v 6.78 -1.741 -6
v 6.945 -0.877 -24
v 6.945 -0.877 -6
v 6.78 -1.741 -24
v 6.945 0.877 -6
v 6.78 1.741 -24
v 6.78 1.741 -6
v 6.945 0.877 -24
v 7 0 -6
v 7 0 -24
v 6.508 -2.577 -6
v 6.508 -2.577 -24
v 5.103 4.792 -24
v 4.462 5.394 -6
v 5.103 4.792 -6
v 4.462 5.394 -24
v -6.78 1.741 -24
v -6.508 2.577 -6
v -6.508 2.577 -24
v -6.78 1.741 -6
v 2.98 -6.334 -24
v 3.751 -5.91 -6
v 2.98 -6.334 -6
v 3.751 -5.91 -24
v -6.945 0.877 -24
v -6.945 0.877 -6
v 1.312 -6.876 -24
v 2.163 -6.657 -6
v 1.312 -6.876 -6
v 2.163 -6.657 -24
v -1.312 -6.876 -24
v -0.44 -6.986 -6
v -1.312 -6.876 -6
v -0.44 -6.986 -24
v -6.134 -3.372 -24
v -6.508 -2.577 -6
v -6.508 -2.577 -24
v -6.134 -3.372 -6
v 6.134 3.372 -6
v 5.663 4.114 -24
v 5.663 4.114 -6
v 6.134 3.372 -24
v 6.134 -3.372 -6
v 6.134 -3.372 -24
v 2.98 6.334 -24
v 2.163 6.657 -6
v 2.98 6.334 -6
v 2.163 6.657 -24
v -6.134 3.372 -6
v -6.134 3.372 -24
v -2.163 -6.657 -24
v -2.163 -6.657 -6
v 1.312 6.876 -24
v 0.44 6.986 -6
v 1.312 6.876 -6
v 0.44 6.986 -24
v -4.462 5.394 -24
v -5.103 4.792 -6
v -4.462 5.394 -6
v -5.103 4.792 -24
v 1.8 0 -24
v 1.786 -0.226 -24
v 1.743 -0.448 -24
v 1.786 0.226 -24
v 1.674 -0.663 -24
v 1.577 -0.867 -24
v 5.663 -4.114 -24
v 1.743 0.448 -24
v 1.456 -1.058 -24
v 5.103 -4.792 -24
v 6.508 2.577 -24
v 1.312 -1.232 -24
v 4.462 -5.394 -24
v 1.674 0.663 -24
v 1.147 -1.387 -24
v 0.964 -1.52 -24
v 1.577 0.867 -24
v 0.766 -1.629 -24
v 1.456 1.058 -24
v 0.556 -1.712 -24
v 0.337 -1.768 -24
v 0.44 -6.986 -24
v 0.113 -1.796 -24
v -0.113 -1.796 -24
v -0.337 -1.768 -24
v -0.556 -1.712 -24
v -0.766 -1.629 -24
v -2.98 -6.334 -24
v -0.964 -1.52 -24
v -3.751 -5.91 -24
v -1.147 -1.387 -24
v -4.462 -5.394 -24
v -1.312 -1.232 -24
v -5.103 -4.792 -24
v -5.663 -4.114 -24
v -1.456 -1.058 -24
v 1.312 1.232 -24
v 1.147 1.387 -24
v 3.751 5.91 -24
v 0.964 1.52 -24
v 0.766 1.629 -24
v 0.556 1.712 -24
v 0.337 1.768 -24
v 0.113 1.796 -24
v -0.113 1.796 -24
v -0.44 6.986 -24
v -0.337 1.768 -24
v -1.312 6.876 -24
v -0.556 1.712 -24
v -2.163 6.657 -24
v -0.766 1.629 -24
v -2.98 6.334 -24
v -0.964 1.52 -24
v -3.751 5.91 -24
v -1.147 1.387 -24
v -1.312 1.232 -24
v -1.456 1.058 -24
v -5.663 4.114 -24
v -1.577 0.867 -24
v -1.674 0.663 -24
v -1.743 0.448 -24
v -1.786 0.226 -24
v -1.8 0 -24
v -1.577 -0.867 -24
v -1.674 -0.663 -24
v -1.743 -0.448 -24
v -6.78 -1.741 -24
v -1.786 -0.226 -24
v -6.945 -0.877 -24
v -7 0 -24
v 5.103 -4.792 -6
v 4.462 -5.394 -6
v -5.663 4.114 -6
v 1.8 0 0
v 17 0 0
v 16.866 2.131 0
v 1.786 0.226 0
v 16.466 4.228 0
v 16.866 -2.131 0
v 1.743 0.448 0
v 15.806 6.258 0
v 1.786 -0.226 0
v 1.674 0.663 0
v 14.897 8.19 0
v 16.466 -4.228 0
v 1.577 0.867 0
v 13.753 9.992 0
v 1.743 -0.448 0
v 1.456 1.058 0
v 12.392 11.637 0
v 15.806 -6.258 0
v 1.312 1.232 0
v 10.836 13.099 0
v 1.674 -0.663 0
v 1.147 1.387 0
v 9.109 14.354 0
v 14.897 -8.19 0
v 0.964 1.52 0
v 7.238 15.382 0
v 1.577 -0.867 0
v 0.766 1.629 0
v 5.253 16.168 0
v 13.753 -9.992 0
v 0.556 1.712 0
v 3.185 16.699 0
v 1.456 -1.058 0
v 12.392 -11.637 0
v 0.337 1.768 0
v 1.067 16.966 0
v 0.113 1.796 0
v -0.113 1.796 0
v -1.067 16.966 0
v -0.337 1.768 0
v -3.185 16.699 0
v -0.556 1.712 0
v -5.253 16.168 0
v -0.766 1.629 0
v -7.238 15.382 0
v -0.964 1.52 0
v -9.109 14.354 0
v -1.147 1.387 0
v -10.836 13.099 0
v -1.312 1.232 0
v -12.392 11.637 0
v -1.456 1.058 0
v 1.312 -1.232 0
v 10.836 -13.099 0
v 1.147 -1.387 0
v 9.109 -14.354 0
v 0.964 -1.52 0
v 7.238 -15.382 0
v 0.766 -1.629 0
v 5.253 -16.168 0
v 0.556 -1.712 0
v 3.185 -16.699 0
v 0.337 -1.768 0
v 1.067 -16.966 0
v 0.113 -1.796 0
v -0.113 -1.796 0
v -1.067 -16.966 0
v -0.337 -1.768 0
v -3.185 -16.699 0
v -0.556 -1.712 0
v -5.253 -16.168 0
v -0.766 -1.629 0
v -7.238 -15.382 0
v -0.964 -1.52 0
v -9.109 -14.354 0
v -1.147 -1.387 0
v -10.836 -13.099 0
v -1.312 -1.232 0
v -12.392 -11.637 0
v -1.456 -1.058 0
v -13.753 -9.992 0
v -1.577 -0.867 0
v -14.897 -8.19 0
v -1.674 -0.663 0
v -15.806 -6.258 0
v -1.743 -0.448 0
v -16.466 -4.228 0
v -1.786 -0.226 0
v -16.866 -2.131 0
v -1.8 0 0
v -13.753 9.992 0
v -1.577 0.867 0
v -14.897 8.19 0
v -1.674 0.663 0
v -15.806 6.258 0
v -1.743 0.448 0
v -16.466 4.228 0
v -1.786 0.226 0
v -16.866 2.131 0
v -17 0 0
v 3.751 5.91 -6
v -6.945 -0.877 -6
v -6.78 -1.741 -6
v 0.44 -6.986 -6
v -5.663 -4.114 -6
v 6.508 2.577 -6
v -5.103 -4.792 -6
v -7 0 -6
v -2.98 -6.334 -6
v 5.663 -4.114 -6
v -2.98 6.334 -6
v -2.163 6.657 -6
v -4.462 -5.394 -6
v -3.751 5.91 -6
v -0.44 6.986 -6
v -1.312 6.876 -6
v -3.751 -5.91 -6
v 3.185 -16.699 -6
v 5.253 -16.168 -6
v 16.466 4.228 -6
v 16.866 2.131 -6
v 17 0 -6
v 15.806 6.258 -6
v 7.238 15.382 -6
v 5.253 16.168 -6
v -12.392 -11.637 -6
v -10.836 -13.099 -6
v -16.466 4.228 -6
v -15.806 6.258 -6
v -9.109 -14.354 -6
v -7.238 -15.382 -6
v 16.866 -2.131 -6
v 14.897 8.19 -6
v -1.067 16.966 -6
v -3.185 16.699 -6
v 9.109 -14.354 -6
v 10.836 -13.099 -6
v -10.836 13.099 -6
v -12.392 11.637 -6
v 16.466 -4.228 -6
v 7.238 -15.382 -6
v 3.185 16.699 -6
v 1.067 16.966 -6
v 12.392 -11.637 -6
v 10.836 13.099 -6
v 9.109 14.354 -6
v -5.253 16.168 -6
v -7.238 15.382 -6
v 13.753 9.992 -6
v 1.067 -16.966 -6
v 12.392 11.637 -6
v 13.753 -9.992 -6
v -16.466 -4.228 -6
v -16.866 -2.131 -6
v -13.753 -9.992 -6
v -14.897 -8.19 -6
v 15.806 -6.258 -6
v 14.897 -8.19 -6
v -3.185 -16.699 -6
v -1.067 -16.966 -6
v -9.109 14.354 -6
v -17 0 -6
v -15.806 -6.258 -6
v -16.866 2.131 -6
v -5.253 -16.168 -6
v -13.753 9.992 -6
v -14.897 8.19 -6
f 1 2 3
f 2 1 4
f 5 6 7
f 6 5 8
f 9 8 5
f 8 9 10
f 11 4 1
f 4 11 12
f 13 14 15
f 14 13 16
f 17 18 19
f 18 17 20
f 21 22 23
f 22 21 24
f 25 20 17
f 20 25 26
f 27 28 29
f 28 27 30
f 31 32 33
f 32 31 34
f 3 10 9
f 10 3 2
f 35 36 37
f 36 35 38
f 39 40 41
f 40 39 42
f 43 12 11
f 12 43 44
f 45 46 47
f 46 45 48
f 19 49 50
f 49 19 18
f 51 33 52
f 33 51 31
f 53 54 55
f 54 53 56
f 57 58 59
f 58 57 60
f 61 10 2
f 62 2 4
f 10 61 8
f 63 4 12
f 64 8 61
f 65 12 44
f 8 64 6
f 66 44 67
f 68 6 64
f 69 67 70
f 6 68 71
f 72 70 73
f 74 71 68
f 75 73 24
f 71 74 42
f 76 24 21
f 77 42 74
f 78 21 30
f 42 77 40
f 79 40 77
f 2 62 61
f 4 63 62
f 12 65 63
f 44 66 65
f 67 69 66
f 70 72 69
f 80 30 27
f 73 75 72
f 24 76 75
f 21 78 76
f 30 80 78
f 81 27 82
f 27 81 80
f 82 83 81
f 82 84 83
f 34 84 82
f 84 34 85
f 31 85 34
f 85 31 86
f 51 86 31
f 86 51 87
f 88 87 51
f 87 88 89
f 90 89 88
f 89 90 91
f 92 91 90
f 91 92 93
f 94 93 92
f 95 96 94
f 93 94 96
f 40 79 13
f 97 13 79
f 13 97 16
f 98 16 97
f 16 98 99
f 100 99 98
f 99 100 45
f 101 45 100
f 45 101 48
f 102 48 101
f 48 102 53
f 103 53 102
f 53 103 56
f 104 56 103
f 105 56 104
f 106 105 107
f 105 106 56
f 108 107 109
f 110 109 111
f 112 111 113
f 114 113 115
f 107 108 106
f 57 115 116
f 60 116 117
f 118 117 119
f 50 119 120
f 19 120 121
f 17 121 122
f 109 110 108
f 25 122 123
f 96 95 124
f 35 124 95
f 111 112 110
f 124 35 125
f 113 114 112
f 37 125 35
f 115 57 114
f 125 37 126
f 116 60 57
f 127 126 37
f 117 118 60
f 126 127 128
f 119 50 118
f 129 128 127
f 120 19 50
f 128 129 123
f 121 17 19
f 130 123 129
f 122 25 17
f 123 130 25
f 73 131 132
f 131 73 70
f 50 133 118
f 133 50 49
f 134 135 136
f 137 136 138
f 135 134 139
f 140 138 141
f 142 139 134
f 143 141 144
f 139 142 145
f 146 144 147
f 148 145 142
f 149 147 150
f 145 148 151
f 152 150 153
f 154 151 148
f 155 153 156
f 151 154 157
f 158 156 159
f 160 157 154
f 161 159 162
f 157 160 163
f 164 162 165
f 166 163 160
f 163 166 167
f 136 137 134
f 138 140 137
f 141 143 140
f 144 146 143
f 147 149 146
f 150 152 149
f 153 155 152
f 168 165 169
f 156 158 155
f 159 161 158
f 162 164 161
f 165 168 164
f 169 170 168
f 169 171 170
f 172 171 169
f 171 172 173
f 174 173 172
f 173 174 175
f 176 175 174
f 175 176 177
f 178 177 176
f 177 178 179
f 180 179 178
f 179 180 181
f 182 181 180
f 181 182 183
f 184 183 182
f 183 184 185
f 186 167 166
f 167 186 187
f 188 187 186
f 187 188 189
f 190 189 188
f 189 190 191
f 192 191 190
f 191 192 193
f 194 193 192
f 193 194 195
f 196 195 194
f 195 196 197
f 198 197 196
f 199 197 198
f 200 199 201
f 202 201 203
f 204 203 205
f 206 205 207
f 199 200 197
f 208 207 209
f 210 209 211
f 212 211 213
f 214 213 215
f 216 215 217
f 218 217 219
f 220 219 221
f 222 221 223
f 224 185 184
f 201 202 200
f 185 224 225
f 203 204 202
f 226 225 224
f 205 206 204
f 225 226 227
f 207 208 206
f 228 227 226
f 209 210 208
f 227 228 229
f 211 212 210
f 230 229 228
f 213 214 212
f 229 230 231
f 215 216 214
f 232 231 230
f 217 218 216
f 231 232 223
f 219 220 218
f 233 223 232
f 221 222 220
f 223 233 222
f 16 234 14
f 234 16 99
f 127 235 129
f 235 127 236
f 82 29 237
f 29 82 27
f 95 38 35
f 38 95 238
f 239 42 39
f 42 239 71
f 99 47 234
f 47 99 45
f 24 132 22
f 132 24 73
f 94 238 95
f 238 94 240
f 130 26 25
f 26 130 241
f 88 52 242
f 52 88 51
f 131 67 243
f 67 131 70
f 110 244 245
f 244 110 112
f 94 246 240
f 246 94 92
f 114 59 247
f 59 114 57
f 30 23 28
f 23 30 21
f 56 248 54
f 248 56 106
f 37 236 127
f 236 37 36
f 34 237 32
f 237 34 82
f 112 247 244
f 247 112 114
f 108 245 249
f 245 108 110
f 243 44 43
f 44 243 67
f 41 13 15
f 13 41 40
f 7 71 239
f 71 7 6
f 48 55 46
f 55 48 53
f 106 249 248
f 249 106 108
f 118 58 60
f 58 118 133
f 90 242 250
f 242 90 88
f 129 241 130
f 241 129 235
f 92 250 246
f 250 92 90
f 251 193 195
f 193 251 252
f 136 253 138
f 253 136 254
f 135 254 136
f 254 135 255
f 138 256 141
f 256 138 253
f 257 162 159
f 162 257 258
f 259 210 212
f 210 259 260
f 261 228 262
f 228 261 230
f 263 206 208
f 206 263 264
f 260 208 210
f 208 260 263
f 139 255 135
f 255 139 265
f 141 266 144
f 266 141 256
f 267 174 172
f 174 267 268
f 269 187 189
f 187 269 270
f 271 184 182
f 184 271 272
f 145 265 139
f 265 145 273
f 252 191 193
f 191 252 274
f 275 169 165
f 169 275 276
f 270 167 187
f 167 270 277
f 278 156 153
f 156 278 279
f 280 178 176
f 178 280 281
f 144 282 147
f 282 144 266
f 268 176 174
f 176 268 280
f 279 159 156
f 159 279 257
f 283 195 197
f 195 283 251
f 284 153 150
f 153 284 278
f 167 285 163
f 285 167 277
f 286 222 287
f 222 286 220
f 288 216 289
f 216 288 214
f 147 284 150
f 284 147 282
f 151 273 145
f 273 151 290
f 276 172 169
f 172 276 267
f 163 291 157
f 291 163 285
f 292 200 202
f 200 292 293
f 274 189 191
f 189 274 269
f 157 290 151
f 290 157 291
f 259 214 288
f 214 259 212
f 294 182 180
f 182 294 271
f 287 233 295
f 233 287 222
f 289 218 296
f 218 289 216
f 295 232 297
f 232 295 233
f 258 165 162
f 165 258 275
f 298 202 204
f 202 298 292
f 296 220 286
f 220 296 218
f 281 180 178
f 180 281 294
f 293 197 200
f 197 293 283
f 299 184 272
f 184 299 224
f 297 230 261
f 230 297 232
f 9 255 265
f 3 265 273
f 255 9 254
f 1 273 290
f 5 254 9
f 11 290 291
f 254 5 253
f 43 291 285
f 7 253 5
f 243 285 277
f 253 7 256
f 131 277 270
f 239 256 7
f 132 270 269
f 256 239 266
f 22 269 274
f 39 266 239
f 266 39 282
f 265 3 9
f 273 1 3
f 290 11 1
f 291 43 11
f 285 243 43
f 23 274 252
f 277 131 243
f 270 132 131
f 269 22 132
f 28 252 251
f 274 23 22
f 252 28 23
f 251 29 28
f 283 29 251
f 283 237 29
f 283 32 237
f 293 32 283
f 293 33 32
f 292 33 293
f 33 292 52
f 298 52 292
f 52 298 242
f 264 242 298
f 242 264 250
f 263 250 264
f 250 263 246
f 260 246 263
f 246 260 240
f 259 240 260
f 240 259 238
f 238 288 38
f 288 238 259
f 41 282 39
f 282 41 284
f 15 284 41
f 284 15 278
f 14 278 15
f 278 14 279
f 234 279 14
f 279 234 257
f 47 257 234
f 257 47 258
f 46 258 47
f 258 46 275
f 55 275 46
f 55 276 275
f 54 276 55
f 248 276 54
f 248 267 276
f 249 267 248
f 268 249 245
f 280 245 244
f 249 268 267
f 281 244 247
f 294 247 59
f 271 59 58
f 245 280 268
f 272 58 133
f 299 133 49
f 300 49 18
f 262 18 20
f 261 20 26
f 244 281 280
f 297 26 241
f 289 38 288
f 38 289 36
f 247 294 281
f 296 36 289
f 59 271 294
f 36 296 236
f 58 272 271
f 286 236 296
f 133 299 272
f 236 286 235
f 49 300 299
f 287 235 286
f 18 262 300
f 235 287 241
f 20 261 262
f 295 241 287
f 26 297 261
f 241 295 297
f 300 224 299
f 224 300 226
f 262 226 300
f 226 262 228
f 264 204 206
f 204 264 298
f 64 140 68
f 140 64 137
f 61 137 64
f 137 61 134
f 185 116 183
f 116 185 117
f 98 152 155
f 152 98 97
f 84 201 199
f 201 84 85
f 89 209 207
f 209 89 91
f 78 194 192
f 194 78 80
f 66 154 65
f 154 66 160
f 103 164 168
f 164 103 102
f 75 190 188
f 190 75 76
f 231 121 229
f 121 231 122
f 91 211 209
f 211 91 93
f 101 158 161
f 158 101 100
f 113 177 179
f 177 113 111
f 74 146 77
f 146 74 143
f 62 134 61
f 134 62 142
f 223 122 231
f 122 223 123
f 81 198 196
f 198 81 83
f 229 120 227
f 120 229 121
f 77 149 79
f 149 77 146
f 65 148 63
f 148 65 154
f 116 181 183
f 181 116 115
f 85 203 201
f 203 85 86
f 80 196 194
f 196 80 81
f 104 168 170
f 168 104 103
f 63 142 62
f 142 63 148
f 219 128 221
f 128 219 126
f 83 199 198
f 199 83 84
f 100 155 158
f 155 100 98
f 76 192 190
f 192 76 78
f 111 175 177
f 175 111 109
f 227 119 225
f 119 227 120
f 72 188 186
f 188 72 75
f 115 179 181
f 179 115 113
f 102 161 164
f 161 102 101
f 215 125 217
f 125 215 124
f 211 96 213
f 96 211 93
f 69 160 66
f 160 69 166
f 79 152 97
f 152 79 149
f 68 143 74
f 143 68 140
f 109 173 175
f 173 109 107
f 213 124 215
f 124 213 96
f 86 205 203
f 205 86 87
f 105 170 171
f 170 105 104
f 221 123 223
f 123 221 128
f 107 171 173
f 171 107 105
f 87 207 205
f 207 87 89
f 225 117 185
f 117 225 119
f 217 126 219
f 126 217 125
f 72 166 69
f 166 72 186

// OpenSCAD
$fn = 50;


difference() {
	union() {
		translate(v = [0, 0, -24.0000000000]) {
			cylinder(h = 24, r = 7.0000000000);
		}
		translate(v = [0, 0, -6.0000000000]) {
			cylinder(h = 6, r = 17.0000000000);
		}
	}
	union() {
		#translate(v = [0, 0, -24]) {
			cylinder(h = 24, r = 1.8000000000);
		}
	}
}
